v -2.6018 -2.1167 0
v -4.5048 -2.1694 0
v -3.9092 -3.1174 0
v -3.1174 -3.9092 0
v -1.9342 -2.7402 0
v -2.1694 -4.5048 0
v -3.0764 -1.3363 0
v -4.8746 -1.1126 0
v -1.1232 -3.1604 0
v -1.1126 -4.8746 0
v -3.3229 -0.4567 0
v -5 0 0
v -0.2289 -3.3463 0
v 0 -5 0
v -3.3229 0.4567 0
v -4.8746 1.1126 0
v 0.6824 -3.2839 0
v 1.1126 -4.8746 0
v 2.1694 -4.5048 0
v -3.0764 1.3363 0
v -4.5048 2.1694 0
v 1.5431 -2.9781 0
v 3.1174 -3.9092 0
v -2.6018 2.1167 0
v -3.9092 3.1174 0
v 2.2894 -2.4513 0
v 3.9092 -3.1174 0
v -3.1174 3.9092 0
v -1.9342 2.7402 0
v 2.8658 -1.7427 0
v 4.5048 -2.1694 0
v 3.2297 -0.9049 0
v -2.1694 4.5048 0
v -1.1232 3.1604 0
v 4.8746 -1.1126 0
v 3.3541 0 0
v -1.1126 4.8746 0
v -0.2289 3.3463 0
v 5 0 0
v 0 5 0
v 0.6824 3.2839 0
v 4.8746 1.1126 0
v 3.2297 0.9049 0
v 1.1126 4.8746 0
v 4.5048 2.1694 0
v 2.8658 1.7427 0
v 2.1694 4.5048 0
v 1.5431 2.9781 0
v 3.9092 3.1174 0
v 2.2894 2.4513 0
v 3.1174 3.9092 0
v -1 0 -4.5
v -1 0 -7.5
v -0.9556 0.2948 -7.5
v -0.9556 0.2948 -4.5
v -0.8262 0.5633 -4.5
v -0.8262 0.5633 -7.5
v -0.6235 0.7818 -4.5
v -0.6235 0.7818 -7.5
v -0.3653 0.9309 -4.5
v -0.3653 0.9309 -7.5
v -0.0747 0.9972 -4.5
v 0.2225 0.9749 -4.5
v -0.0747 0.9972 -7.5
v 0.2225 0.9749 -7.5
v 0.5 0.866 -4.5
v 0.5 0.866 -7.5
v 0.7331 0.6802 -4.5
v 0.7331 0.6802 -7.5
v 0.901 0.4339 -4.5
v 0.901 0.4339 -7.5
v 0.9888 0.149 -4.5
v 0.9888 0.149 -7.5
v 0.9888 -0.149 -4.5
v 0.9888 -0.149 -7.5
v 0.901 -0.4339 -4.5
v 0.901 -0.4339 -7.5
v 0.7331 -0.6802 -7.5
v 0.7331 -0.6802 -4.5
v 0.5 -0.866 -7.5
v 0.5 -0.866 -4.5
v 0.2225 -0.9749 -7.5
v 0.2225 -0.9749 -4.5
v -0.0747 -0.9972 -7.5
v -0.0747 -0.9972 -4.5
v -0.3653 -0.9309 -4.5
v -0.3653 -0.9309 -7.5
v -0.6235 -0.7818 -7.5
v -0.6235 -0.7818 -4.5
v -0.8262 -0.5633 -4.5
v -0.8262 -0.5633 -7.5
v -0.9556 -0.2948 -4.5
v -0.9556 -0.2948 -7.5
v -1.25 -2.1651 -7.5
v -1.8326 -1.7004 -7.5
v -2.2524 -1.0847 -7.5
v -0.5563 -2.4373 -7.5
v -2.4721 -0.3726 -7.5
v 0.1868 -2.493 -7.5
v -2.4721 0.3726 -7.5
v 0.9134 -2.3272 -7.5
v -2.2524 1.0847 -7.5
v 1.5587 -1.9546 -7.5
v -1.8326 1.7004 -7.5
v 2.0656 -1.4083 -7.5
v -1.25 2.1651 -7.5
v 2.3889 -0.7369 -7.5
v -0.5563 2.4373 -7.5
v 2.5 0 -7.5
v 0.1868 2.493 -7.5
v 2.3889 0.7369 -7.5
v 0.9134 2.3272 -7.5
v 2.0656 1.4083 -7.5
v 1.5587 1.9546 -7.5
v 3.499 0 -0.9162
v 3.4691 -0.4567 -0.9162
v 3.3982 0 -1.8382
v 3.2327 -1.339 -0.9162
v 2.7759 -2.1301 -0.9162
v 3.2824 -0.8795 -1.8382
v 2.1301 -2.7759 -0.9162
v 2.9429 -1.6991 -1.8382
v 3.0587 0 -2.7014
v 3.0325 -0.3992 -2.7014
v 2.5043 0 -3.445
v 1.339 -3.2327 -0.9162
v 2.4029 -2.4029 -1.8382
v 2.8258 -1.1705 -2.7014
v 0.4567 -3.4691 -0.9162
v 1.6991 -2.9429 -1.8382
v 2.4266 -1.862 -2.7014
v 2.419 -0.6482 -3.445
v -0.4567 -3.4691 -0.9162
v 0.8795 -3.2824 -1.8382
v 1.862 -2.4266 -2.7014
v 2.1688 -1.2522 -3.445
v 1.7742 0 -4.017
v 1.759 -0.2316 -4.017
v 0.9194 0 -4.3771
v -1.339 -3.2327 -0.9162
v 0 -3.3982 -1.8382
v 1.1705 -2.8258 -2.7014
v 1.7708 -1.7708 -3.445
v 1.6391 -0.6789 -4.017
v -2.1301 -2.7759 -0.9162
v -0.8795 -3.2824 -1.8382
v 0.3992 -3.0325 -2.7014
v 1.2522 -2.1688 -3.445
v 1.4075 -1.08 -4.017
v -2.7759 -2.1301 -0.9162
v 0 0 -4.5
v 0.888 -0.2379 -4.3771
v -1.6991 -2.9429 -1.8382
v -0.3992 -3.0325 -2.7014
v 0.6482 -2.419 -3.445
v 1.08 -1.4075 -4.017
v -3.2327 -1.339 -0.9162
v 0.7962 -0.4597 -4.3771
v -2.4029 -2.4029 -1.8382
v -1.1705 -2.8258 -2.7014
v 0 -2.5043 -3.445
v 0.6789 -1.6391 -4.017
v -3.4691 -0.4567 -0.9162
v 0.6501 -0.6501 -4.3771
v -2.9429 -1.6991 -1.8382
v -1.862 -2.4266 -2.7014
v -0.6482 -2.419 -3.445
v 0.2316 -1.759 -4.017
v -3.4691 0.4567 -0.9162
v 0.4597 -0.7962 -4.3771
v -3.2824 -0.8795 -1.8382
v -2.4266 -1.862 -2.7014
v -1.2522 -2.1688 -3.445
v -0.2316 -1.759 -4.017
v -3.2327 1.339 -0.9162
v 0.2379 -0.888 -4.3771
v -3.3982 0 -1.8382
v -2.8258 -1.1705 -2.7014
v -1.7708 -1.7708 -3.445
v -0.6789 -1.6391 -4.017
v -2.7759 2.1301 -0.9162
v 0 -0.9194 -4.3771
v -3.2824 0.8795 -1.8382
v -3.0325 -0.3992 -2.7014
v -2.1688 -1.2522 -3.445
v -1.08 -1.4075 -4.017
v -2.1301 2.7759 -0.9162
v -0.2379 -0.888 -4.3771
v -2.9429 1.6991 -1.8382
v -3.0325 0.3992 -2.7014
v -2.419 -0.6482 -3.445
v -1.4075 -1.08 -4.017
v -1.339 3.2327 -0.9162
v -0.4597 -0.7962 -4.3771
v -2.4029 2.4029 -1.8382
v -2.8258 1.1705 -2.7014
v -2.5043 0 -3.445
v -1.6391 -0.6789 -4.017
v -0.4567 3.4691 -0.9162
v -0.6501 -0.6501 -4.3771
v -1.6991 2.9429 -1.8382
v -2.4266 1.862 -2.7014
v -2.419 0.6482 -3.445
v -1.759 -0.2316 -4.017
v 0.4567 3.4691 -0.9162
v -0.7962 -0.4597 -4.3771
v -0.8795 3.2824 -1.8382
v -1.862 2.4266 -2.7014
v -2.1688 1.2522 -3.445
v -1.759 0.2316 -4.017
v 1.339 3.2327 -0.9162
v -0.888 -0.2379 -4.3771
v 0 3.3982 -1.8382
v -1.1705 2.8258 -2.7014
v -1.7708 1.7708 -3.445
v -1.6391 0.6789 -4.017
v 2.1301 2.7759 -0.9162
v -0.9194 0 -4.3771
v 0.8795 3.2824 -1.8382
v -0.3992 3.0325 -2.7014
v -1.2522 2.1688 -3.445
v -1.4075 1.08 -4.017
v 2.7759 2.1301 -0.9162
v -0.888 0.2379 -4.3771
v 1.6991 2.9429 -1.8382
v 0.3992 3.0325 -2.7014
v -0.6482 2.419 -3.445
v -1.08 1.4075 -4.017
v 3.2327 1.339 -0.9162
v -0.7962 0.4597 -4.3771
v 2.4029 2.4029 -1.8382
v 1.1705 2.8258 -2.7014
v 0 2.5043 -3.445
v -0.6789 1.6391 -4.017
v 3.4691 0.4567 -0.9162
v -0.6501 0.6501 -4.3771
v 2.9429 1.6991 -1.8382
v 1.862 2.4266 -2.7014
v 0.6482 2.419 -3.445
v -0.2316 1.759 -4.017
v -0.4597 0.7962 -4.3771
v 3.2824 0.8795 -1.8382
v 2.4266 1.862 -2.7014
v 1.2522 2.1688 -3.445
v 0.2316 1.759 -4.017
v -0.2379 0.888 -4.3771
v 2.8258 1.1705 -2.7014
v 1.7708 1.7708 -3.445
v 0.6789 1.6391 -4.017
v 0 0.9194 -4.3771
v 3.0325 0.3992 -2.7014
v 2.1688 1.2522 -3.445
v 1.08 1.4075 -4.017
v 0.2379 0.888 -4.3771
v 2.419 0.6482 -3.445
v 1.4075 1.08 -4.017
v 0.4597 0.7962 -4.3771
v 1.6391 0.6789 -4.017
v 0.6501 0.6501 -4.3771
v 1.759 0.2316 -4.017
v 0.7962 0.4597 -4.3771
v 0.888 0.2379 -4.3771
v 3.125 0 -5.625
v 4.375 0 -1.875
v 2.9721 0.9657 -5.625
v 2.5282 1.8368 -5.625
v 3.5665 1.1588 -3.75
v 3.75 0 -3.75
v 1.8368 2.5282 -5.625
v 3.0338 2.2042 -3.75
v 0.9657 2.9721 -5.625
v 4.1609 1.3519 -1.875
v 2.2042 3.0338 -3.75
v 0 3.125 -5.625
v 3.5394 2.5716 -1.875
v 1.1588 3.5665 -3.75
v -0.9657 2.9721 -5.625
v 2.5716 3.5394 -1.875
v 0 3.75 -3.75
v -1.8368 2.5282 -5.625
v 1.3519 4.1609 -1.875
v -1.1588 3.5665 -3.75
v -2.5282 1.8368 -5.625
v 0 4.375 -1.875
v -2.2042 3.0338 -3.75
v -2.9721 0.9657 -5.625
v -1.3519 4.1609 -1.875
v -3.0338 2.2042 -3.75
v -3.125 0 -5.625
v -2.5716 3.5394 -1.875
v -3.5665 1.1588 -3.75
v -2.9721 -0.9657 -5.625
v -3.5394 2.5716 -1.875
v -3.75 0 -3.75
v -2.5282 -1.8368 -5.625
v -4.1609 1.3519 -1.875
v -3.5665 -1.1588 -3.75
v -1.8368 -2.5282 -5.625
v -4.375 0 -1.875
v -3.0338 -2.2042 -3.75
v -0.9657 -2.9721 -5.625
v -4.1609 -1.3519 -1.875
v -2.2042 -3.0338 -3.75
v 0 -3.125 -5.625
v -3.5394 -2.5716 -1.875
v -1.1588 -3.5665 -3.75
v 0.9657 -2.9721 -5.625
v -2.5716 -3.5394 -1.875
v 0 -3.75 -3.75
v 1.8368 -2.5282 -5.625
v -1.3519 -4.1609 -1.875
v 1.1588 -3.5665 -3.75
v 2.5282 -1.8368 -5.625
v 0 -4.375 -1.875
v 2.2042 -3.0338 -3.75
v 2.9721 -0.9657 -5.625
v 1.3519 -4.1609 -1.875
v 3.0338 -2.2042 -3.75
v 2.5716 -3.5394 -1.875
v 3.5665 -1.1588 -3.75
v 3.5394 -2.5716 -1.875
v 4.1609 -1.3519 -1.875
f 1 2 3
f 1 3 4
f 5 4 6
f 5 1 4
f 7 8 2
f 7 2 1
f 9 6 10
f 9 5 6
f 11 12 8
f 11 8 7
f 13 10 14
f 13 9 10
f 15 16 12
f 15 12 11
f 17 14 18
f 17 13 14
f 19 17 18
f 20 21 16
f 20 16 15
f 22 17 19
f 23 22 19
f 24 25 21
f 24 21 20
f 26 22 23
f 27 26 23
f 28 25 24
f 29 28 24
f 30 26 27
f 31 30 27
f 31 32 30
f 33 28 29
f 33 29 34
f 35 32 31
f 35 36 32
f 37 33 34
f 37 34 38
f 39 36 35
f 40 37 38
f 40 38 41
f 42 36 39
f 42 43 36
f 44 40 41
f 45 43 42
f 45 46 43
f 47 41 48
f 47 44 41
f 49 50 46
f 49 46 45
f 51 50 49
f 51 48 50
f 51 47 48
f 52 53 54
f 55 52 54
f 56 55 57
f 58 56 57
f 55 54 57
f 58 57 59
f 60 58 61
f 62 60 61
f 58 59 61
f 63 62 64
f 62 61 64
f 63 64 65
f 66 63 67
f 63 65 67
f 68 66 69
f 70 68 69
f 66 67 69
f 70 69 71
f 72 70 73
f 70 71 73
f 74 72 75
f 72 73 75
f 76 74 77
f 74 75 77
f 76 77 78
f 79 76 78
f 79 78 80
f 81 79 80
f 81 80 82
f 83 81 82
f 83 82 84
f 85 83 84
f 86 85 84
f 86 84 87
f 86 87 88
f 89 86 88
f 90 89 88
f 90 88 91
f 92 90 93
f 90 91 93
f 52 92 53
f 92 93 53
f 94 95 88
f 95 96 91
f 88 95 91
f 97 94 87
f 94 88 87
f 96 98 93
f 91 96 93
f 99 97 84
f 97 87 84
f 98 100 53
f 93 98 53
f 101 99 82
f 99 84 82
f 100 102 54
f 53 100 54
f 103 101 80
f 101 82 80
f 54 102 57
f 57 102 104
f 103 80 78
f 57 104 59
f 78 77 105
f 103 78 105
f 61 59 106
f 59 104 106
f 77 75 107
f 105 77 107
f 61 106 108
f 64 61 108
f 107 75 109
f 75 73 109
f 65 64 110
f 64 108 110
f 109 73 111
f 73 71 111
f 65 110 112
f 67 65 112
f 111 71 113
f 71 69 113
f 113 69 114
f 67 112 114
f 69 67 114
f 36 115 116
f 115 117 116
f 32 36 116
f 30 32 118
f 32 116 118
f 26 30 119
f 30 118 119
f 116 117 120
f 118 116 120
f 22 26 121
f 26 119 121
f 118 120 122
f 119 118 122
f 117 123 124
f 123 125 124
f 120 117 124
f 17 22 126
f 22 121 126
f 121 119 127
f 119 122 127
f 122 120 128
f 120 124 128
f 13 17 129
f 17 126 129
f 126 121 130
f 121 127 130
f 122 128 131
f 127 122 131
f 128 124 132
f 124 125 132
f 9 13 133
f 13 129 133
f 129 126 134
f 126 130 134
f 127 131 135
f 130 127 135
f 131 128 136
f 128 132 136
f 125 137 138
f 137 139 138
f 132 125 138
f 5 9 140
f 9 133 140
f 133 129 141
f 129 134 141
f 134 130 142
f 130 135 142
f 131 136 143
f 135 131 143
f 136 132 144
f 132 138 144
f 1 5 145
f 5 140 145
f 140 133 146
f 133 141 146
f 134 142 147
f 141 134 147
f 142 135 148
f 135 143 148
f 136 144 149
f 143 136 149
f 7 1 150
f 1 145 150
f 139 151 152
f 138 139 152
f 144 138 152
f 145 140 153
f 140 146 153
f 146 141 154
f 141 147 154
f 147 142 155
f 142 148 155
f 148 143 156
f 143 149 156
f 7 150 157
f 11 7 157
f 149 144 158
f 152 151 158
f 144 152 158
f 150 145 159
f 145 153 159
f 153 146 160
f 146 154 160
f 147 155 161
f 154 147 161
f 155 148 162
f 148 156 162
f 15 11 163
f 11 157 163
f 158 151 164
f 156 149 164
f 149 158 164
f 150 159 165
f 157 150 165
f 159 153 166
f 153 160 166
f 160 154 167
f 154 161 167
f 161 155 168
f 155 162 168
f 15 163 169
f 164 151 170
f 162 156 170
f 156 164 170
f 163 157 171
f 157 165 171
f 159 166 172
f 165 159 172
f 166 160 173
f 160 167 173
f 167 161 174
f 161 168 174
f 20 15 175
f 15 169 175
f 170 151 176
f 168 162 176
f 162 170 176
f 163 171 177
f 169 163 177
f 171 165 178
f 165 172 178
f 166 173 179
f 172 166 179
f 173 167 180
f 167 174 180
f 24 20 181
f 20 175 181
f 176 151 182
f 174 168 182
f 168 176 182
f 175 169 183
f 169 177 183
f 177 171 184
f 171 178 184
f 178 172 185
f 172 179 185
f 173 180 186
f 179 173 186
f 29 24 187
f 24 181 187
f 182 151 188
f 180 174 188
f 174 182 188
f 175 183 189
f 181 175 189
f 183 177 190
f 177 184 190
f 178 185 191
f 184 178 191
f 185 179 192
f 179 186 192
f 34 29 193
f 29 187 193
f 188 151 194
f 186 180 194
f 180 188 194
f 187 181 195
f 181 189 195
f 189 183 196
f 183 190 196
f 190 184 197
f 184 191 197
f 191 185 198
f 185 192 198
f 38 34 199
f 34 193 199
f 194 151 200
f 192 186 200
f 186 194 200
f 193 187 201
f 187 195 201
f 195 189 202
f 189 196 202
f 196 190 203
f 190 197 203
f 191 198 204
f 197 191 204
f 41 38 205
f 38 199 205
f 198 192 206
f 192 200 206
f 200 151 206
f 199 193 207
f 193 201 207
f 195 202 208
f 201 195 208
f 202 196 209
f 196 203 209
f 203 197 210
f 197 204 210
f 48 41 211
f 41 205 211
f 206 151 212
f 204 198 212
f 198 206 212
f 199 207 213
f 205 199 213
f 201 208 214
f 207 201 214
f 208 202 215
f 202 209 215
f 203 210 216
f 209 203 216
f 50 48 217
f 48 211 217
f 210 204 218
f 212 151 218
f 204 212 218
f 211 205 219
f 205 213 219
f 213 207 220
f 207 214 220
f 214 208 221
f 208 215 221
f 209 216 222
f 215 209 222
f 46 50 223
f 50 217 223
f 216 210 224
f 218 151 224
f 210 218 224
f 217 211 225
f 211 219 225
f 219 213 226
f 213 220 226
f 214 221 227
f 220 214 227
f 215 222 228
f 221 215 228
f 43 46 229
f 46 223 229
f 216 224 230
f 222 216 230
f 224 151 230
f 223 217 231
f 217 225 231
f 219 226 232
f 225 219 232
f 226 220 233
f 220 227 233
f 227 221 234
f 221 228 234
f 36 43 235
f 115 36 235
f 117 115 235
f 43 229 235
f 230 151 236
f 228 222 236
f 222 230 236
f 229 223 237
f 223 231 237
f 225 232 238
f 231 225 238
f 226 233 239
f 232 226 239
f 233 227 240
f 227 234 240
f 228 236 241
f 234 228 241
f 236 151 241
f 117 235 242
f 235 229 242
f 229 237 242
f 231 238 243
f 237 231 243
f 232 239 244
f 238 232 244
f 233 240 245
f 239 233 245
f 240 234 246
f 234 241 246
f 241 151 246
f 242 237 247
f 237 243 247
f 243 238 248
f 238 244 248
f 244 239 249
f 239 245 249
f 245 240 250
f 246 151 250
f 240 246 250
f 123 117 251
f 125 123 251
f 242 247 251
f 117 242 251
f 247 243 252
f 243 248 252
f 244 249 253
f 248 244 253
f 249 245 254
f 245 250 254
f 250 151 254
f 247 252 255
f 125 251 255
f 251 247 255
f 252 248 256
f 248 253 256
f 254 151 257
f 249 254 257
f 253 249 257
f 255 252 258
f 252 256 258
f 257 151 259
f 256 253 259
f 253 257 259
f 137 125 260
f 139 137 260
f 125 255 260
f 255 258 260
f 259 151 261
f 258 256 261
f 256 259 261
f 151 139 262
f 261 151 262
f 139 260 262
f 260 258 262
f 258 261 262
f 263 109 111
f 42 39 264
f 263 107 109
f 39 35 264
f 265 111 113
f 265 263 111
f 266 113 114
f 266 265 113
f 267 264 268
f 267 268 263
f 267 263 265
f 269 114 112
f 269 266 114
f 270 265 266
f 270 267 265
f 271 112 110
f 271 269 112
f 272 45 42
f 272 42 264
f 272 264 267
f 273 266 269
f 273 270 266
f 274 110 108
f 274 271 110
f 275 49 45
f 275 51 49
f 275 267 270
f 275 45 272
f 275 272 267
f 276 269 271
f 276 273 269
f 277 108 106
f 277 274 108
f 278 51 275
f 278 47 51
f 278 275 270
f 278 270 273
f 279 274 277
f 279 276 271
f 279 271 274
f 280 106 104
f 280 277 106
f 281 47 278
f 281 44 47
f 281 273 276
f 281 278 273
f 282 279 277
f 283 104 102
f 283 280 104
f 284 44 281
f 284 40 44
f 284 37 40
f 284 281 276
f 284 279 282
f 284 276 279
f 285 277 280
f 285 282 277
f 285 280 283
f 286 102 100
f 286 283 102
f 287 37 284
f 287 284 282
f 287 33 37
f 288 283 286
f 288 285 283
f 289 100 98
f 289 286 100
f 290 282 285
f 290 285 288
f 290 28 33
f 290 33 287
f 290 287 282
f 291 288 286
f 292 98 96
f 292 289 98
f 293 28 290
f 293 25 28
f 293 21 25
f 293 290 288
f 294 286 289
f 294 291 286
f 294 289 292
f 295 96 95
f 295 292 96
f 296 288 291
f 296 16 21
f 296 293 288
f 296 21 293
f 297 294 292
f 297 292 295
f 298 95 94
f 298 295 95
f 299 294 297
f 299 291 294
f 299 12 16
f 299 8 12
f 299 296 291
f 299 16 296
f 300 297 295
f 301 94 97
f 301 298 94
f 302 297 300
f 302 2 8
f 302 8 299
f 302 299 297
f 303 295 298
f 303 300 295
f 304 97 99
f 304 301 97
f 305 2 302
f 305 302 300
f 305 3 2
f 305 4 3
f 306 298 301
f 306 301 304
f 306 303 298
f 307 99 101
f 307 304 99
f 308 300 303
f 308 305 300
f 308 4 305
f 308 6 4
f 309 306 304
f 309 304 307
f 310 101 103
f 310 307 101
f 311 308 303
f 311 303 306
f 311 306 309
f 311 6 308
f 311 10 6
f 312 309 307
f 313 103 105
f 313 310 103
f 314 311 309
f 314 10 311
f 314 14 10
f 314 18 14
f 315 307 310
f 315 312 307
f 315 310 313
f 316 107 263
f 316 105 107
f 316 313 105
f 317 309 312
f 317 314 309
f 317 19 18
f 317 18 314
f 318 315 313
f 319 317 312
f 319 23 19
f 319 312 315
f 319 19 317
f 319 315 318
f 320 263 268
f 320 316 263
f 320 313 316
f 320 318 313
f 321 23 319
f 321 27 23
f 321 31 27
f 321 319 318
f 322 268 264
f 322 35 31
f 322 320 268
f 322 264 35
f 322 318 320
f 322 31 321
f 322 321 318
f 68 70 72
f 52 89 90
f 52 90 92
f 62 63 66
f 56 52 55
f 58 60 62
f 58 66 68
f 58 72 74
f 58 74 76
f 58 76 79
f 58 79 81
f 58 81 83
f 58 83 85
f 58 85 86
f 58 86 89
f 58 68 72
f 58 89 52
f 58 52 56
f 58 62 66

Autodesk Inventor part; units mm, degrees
ref_plane "YZ Plane" through (0, 0, 0) normal (1, 0, 0) x (0, 1, 0)
ref_plane "XZ Plane" through (0, 0, 0) normal (0, 1, 0) x (-1, 0, 0)
sketch "Sketch1" plane through (0, 0, 0) normal (0, 0, 1) x (1, 0, 0)
  circle A0 centre (0, 0) radius 5
  dimension "d0" = 10
ref_plane "Work Plane1" through (0, 0, -7.5) normal (0, 0, 1) x (1, 0, 0)
sketch "Sketch2" plane through (0, 0, -7.5) normal (0, 0, 1) x (1, 0, 0)
  circle A0 centre (0, 0) radius 2.5
  dimension "d2" = 5
loft "Loft1" add profiles "Sketch1", "Sketch2"
sketch "Sketch3" plane through (0, 0, 0) normal (0, 1, 0) x (-1, 0, 0)
  arc A0 (0, 2.5) -> (0, -4.5) centre (0, -1) ccw
  line L0 (0, 5.5184) -> (0, -9.2276)
  line L1 (2.5, -7.5) -> (-2.5, -7.5) projected
  point P0 (0, 0)
  dimension "d7" = 7
  dimension "d9" = 1
revolve "Revolution1" cut sketch "Sketch3" angle 360 about axis through (0, 0, 5.5184) along (0, 0, -1)
sketch "Sketch4" plane through (0, 0, -7.5) normal (0, 0, -1) x (-1, 0, 0)
  circle A0 centre (0, 0) radius 1
  dimension "d10" = 2
extrude "Extrusion1" cut sketch "Sketch4" against normal blind 3
properties part number "Socket"
